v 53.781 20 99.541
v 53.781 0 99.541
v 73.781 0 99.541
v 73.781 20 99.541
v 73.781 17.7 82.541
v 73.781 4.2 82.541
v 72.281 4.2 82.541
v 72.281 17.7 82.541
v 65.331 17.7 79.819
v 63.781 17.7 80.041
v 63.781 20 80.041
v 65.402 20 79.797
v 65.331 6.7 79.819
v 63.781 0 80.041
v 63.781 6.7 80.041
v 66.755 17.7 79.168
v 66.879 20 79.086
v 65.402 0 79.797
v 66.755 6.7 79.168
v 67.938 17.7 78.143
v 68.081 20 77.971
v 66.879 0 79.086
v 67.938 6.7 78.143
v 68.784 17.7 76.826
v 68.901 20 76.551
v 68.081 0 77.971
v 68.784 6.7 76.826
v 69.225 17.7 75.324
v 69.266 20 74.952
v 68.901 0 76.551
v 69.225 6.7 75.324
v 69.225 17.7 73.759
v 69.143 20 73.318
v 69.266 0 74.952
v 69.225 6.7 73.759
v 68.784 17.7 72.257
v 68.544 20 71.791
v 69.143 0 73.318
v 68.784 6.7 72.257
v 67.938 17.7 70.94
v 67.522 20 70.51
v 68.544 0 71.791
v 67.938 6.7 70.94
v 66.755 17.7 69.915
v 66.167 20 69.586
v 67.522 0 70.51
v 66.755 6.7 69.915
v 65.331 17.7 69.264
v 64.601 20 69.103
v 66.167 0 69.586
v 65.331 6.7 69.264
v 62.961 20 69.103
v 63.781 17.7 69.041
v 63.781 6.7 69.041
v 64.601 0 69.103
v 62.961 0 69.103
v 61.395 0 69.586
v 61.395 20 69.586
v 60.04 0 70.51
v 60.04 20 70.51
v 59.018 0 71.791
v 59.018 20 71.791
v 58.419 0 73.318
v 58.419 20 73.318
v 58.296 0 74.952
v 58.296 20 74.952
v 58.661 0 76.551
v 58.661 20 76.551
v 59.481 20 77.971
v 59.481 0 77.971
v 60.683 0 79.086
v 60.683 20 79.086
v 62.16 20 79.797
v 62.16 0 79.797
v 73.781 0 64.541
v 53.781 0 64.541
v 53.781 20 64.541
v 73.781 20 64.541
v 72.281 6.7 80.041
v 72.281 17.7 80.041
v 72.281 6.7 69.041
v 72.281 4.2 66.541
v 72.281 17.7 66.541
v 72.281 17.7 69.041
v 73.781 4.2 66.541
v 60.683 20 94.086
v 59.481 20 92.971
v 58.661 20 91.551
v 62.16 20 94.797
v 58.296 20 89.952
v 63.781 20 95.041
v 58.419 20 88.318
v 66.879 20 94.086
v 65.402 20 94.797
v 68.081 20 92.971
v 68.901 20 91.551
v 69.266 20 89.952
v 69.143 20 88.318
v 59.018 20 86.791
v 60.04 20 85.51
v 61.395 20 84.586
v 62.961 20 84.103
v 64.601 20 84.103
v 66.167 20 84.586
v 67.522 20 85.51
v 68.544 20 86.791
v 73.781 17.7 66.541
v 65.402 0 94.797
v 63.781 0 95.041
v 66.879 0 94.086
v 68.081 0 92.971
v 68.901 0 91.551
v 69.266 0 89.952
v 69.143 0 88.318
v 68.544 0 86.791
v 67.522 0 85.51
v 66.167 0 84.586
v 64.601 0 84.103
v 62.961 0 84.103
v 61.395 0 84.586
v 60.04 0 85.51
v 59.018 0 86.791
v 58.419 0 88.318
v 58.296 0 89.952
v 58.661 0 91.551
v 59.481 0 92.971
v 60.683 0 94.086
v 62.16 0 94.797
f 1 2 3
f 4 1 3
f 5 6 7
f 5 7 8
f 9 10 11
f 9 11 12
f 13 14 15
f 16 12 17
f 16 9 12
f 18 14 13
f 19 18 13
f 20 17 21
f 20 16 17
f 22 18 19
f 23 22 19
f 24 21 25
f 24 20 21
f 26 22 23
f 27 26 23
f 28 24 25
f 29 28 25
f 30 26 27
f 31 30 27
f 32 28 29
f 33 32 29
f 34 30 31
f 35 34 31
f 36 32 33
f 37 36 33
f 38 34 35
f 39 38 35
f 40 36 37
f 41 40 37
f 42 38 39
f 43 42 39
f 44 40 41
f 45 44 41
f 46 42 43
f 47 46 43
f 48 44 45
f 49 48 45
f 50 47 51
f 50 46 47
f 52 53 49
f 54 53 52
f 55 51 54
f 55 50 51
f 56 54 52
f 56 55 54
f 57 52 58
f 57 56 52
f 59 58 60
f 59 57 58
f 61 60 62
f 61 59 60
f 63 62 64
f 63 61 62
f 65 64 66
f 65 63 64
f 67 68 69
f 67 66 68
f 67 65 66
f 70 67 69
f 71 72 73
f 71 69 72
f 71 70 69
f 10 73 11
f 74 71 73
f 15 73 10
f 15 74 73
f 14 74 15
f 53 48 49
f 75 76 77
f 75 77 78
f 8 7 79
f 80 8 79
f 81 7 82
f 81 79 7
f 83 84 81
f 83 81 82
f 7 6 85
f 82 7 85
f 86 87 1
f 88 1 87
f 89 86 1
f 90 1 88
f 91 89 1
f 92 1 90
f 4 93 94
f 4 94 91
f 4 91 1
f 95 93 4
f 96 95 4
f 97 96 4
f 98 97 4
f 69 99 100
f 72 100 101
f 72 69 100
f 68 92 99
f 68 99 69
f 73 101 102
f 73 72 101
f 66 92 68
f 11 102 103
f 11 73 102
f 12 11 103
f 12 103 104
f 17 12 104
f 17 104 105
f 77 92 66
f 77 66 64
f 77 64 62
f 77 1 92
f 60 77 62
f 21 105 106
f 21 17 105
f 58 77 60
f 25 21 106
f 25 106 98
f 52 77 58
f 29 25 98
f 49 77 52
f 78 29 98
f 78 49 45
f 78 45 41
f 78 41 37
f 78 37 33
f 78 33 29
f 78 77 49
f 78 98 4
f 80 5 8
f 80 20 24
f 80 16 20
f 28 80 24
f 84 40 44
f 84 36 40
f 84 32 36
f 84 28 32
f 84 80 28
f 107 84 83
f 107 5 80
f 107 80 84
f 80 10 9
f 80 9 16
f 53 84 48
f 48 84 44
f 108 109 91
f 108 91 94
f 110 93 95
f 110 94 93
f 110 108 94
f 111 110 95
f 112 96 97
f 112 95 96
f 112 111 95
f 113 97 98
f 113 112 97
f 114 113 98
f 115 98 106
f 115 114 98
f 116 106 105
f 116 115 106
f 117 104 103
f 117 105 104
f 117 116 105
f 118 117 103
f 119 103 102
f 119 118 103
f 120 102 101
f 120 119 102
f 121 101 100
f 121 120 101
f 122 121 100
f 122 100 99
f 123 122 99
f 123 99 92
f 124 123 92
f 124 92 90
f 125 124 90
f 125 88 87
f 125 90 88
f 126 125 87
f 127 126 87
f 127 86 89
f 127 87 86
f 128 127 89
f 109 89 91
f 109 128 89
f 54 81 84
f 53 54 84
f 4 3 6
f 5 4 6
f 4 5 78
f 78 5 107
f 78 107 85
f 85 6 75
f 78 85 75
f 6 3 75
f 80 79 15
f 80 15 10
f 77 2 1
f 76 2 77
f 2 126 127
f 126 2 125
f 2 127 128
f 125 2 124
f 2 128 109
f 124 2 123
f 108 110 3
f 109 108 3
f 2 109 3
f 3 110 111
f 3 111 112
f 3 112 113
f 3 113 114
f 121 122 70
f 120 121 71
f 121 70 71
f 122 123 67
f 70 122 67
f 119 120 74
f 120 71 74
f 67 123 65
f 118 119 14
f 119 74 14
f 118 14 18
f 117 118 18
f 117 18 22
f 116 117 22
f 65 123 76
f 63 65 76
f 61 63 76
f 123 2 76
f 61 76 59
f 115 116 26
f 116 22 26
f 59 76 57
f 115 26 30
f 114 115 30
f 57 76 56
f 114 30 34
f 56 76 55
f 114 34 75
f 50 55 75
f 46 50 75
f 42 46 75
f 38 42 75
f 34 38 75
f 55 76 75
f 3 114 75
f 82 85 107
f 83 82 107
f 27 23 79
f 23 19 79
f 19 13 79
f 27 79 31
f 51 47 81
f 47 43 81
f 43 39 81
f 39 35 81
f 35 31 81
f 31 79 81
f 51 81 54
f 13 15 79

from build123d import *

# Parameters (mm, degrees)
CROQUIS1_W                 = 20
CROQUIS1_H                 = 35
CROQUIS1_R                 = 5
SALIENTE_EXTRUIR1_DEPTH    = 20
CROQUIS2_R                 = 2
SALIENTE_EXTRUIR2_DEPTH    = 8
CORTAR_EXTRUIR1_DEPTH      = 131.371097716
CORTAR_EXTRUIR1_DEPTH_BACK = 131.371097716
CROQUIS3_R                 = 5.5
CROQUIS4_W                 = 11
CROQUIS4_H                 = 11
CORTAR_EXTRUIR2_DEPTH      = 18
CROQUIS7_W                 = 16
CROQUIS7_H                 = 13.5
CORTAR_EXTRUIR3_DEPTH      = 1.5


with BuildPart() as part:
    # Croquis1 → Saliente-Extruir1 (new body)
    with BuildSketch(Plane(origin=(0, 0, 0), x_dir=(1, 0, 0), z_dir=(0, 1, 0))):
        with Locations((63.781004701, -82.04140038)):
            Rectangle(CROQUIS1_W, CROQUIS1_H)
        with Locations(Location((63.781004701, -89.54140038, 0), (0, 0, 270))):
            Circle(CROQUIS1_R, mode=Mode.SUBTRACT)
        with Locations(Location((63.781004701, -74.54140038, 0), (0, 0, 270))):
            Circle(CROQUIS1_R, mode=Mode.SUBTRACT)
    extrude(amount=SALIENTE_EXTRUIR1_DEPTH)

    # Croquis2 → Saliente-Extruir2 (add)
    with BuildSketch(Plane(origin=(73.781004701, 0, 0), x_dir=(0, 0, -1), z_dir=(1, 0, 0))):
        with Locations(Location((-74.54140038, 12.2, 0), (0, 0, 180))):
            Circle(CROQUIS2_R)
    extrude(amount=SALIENTE_EXTRUIR2_DEPTH)

    # Croquis3 → Cortar-Extruir1 (cut, two sides: drawn at the far end of the back side and taken through both)
    with BuildSketch(Plane(origin=(0, 20, 0), x_dir=(1, 0, 0), z_dir=(0, 1, 0)).offset(-CORTAR_EXTRUIR1_DEPTH_BACK)):
        with Locations(Location((63.781004701, -74.54140038, 0), (0, 0, 270))):
            Circle(CROQUIS3_R)
        with Locations(Location((63.781004701, -89.54140038, 0), (0, 0, 270))):
            Circle(CROQUIS3_R)
    extrude(amount=CORTAR_EXTRUIR1_DEPTH + CORTAR_EXTRUIR1_DEPTH_BACK, mode=Mode.SUBTRACT)

    # Croquis4 → Cortar-Extruir2 (cut)
    with BuildSketch(Plane(origin=(81.781004701, 0, 0), x_dir=(0, 0, -1), z_dir=(1, 0, 0))):
        with Locations((-74.54140038, 12.2)):
            Rectangle(CROQUIS4_W, CROQUIS4_H)
    extrude(amount=-CORTAR_EXTRUIR2_DEPTH, mode=Mode.SUBTRACT)

    # Croquis7 → Cortar-Extruir3 (cut)
    with BuildSketch(Plane(origin=(73.781004701, 0, 0), x_dir=(0, 0, -1), z_dir=(1, 0, 0))):
        with Locations((-74.54140038, 10.95)):
            Rectangle(CROQUIS7_W, CROQUIS7_H)
    extrude(amount=-CORTAR_EXTRUIR3_DEPTH, mode=Mode.SUBTRACT)


solid = part.part
